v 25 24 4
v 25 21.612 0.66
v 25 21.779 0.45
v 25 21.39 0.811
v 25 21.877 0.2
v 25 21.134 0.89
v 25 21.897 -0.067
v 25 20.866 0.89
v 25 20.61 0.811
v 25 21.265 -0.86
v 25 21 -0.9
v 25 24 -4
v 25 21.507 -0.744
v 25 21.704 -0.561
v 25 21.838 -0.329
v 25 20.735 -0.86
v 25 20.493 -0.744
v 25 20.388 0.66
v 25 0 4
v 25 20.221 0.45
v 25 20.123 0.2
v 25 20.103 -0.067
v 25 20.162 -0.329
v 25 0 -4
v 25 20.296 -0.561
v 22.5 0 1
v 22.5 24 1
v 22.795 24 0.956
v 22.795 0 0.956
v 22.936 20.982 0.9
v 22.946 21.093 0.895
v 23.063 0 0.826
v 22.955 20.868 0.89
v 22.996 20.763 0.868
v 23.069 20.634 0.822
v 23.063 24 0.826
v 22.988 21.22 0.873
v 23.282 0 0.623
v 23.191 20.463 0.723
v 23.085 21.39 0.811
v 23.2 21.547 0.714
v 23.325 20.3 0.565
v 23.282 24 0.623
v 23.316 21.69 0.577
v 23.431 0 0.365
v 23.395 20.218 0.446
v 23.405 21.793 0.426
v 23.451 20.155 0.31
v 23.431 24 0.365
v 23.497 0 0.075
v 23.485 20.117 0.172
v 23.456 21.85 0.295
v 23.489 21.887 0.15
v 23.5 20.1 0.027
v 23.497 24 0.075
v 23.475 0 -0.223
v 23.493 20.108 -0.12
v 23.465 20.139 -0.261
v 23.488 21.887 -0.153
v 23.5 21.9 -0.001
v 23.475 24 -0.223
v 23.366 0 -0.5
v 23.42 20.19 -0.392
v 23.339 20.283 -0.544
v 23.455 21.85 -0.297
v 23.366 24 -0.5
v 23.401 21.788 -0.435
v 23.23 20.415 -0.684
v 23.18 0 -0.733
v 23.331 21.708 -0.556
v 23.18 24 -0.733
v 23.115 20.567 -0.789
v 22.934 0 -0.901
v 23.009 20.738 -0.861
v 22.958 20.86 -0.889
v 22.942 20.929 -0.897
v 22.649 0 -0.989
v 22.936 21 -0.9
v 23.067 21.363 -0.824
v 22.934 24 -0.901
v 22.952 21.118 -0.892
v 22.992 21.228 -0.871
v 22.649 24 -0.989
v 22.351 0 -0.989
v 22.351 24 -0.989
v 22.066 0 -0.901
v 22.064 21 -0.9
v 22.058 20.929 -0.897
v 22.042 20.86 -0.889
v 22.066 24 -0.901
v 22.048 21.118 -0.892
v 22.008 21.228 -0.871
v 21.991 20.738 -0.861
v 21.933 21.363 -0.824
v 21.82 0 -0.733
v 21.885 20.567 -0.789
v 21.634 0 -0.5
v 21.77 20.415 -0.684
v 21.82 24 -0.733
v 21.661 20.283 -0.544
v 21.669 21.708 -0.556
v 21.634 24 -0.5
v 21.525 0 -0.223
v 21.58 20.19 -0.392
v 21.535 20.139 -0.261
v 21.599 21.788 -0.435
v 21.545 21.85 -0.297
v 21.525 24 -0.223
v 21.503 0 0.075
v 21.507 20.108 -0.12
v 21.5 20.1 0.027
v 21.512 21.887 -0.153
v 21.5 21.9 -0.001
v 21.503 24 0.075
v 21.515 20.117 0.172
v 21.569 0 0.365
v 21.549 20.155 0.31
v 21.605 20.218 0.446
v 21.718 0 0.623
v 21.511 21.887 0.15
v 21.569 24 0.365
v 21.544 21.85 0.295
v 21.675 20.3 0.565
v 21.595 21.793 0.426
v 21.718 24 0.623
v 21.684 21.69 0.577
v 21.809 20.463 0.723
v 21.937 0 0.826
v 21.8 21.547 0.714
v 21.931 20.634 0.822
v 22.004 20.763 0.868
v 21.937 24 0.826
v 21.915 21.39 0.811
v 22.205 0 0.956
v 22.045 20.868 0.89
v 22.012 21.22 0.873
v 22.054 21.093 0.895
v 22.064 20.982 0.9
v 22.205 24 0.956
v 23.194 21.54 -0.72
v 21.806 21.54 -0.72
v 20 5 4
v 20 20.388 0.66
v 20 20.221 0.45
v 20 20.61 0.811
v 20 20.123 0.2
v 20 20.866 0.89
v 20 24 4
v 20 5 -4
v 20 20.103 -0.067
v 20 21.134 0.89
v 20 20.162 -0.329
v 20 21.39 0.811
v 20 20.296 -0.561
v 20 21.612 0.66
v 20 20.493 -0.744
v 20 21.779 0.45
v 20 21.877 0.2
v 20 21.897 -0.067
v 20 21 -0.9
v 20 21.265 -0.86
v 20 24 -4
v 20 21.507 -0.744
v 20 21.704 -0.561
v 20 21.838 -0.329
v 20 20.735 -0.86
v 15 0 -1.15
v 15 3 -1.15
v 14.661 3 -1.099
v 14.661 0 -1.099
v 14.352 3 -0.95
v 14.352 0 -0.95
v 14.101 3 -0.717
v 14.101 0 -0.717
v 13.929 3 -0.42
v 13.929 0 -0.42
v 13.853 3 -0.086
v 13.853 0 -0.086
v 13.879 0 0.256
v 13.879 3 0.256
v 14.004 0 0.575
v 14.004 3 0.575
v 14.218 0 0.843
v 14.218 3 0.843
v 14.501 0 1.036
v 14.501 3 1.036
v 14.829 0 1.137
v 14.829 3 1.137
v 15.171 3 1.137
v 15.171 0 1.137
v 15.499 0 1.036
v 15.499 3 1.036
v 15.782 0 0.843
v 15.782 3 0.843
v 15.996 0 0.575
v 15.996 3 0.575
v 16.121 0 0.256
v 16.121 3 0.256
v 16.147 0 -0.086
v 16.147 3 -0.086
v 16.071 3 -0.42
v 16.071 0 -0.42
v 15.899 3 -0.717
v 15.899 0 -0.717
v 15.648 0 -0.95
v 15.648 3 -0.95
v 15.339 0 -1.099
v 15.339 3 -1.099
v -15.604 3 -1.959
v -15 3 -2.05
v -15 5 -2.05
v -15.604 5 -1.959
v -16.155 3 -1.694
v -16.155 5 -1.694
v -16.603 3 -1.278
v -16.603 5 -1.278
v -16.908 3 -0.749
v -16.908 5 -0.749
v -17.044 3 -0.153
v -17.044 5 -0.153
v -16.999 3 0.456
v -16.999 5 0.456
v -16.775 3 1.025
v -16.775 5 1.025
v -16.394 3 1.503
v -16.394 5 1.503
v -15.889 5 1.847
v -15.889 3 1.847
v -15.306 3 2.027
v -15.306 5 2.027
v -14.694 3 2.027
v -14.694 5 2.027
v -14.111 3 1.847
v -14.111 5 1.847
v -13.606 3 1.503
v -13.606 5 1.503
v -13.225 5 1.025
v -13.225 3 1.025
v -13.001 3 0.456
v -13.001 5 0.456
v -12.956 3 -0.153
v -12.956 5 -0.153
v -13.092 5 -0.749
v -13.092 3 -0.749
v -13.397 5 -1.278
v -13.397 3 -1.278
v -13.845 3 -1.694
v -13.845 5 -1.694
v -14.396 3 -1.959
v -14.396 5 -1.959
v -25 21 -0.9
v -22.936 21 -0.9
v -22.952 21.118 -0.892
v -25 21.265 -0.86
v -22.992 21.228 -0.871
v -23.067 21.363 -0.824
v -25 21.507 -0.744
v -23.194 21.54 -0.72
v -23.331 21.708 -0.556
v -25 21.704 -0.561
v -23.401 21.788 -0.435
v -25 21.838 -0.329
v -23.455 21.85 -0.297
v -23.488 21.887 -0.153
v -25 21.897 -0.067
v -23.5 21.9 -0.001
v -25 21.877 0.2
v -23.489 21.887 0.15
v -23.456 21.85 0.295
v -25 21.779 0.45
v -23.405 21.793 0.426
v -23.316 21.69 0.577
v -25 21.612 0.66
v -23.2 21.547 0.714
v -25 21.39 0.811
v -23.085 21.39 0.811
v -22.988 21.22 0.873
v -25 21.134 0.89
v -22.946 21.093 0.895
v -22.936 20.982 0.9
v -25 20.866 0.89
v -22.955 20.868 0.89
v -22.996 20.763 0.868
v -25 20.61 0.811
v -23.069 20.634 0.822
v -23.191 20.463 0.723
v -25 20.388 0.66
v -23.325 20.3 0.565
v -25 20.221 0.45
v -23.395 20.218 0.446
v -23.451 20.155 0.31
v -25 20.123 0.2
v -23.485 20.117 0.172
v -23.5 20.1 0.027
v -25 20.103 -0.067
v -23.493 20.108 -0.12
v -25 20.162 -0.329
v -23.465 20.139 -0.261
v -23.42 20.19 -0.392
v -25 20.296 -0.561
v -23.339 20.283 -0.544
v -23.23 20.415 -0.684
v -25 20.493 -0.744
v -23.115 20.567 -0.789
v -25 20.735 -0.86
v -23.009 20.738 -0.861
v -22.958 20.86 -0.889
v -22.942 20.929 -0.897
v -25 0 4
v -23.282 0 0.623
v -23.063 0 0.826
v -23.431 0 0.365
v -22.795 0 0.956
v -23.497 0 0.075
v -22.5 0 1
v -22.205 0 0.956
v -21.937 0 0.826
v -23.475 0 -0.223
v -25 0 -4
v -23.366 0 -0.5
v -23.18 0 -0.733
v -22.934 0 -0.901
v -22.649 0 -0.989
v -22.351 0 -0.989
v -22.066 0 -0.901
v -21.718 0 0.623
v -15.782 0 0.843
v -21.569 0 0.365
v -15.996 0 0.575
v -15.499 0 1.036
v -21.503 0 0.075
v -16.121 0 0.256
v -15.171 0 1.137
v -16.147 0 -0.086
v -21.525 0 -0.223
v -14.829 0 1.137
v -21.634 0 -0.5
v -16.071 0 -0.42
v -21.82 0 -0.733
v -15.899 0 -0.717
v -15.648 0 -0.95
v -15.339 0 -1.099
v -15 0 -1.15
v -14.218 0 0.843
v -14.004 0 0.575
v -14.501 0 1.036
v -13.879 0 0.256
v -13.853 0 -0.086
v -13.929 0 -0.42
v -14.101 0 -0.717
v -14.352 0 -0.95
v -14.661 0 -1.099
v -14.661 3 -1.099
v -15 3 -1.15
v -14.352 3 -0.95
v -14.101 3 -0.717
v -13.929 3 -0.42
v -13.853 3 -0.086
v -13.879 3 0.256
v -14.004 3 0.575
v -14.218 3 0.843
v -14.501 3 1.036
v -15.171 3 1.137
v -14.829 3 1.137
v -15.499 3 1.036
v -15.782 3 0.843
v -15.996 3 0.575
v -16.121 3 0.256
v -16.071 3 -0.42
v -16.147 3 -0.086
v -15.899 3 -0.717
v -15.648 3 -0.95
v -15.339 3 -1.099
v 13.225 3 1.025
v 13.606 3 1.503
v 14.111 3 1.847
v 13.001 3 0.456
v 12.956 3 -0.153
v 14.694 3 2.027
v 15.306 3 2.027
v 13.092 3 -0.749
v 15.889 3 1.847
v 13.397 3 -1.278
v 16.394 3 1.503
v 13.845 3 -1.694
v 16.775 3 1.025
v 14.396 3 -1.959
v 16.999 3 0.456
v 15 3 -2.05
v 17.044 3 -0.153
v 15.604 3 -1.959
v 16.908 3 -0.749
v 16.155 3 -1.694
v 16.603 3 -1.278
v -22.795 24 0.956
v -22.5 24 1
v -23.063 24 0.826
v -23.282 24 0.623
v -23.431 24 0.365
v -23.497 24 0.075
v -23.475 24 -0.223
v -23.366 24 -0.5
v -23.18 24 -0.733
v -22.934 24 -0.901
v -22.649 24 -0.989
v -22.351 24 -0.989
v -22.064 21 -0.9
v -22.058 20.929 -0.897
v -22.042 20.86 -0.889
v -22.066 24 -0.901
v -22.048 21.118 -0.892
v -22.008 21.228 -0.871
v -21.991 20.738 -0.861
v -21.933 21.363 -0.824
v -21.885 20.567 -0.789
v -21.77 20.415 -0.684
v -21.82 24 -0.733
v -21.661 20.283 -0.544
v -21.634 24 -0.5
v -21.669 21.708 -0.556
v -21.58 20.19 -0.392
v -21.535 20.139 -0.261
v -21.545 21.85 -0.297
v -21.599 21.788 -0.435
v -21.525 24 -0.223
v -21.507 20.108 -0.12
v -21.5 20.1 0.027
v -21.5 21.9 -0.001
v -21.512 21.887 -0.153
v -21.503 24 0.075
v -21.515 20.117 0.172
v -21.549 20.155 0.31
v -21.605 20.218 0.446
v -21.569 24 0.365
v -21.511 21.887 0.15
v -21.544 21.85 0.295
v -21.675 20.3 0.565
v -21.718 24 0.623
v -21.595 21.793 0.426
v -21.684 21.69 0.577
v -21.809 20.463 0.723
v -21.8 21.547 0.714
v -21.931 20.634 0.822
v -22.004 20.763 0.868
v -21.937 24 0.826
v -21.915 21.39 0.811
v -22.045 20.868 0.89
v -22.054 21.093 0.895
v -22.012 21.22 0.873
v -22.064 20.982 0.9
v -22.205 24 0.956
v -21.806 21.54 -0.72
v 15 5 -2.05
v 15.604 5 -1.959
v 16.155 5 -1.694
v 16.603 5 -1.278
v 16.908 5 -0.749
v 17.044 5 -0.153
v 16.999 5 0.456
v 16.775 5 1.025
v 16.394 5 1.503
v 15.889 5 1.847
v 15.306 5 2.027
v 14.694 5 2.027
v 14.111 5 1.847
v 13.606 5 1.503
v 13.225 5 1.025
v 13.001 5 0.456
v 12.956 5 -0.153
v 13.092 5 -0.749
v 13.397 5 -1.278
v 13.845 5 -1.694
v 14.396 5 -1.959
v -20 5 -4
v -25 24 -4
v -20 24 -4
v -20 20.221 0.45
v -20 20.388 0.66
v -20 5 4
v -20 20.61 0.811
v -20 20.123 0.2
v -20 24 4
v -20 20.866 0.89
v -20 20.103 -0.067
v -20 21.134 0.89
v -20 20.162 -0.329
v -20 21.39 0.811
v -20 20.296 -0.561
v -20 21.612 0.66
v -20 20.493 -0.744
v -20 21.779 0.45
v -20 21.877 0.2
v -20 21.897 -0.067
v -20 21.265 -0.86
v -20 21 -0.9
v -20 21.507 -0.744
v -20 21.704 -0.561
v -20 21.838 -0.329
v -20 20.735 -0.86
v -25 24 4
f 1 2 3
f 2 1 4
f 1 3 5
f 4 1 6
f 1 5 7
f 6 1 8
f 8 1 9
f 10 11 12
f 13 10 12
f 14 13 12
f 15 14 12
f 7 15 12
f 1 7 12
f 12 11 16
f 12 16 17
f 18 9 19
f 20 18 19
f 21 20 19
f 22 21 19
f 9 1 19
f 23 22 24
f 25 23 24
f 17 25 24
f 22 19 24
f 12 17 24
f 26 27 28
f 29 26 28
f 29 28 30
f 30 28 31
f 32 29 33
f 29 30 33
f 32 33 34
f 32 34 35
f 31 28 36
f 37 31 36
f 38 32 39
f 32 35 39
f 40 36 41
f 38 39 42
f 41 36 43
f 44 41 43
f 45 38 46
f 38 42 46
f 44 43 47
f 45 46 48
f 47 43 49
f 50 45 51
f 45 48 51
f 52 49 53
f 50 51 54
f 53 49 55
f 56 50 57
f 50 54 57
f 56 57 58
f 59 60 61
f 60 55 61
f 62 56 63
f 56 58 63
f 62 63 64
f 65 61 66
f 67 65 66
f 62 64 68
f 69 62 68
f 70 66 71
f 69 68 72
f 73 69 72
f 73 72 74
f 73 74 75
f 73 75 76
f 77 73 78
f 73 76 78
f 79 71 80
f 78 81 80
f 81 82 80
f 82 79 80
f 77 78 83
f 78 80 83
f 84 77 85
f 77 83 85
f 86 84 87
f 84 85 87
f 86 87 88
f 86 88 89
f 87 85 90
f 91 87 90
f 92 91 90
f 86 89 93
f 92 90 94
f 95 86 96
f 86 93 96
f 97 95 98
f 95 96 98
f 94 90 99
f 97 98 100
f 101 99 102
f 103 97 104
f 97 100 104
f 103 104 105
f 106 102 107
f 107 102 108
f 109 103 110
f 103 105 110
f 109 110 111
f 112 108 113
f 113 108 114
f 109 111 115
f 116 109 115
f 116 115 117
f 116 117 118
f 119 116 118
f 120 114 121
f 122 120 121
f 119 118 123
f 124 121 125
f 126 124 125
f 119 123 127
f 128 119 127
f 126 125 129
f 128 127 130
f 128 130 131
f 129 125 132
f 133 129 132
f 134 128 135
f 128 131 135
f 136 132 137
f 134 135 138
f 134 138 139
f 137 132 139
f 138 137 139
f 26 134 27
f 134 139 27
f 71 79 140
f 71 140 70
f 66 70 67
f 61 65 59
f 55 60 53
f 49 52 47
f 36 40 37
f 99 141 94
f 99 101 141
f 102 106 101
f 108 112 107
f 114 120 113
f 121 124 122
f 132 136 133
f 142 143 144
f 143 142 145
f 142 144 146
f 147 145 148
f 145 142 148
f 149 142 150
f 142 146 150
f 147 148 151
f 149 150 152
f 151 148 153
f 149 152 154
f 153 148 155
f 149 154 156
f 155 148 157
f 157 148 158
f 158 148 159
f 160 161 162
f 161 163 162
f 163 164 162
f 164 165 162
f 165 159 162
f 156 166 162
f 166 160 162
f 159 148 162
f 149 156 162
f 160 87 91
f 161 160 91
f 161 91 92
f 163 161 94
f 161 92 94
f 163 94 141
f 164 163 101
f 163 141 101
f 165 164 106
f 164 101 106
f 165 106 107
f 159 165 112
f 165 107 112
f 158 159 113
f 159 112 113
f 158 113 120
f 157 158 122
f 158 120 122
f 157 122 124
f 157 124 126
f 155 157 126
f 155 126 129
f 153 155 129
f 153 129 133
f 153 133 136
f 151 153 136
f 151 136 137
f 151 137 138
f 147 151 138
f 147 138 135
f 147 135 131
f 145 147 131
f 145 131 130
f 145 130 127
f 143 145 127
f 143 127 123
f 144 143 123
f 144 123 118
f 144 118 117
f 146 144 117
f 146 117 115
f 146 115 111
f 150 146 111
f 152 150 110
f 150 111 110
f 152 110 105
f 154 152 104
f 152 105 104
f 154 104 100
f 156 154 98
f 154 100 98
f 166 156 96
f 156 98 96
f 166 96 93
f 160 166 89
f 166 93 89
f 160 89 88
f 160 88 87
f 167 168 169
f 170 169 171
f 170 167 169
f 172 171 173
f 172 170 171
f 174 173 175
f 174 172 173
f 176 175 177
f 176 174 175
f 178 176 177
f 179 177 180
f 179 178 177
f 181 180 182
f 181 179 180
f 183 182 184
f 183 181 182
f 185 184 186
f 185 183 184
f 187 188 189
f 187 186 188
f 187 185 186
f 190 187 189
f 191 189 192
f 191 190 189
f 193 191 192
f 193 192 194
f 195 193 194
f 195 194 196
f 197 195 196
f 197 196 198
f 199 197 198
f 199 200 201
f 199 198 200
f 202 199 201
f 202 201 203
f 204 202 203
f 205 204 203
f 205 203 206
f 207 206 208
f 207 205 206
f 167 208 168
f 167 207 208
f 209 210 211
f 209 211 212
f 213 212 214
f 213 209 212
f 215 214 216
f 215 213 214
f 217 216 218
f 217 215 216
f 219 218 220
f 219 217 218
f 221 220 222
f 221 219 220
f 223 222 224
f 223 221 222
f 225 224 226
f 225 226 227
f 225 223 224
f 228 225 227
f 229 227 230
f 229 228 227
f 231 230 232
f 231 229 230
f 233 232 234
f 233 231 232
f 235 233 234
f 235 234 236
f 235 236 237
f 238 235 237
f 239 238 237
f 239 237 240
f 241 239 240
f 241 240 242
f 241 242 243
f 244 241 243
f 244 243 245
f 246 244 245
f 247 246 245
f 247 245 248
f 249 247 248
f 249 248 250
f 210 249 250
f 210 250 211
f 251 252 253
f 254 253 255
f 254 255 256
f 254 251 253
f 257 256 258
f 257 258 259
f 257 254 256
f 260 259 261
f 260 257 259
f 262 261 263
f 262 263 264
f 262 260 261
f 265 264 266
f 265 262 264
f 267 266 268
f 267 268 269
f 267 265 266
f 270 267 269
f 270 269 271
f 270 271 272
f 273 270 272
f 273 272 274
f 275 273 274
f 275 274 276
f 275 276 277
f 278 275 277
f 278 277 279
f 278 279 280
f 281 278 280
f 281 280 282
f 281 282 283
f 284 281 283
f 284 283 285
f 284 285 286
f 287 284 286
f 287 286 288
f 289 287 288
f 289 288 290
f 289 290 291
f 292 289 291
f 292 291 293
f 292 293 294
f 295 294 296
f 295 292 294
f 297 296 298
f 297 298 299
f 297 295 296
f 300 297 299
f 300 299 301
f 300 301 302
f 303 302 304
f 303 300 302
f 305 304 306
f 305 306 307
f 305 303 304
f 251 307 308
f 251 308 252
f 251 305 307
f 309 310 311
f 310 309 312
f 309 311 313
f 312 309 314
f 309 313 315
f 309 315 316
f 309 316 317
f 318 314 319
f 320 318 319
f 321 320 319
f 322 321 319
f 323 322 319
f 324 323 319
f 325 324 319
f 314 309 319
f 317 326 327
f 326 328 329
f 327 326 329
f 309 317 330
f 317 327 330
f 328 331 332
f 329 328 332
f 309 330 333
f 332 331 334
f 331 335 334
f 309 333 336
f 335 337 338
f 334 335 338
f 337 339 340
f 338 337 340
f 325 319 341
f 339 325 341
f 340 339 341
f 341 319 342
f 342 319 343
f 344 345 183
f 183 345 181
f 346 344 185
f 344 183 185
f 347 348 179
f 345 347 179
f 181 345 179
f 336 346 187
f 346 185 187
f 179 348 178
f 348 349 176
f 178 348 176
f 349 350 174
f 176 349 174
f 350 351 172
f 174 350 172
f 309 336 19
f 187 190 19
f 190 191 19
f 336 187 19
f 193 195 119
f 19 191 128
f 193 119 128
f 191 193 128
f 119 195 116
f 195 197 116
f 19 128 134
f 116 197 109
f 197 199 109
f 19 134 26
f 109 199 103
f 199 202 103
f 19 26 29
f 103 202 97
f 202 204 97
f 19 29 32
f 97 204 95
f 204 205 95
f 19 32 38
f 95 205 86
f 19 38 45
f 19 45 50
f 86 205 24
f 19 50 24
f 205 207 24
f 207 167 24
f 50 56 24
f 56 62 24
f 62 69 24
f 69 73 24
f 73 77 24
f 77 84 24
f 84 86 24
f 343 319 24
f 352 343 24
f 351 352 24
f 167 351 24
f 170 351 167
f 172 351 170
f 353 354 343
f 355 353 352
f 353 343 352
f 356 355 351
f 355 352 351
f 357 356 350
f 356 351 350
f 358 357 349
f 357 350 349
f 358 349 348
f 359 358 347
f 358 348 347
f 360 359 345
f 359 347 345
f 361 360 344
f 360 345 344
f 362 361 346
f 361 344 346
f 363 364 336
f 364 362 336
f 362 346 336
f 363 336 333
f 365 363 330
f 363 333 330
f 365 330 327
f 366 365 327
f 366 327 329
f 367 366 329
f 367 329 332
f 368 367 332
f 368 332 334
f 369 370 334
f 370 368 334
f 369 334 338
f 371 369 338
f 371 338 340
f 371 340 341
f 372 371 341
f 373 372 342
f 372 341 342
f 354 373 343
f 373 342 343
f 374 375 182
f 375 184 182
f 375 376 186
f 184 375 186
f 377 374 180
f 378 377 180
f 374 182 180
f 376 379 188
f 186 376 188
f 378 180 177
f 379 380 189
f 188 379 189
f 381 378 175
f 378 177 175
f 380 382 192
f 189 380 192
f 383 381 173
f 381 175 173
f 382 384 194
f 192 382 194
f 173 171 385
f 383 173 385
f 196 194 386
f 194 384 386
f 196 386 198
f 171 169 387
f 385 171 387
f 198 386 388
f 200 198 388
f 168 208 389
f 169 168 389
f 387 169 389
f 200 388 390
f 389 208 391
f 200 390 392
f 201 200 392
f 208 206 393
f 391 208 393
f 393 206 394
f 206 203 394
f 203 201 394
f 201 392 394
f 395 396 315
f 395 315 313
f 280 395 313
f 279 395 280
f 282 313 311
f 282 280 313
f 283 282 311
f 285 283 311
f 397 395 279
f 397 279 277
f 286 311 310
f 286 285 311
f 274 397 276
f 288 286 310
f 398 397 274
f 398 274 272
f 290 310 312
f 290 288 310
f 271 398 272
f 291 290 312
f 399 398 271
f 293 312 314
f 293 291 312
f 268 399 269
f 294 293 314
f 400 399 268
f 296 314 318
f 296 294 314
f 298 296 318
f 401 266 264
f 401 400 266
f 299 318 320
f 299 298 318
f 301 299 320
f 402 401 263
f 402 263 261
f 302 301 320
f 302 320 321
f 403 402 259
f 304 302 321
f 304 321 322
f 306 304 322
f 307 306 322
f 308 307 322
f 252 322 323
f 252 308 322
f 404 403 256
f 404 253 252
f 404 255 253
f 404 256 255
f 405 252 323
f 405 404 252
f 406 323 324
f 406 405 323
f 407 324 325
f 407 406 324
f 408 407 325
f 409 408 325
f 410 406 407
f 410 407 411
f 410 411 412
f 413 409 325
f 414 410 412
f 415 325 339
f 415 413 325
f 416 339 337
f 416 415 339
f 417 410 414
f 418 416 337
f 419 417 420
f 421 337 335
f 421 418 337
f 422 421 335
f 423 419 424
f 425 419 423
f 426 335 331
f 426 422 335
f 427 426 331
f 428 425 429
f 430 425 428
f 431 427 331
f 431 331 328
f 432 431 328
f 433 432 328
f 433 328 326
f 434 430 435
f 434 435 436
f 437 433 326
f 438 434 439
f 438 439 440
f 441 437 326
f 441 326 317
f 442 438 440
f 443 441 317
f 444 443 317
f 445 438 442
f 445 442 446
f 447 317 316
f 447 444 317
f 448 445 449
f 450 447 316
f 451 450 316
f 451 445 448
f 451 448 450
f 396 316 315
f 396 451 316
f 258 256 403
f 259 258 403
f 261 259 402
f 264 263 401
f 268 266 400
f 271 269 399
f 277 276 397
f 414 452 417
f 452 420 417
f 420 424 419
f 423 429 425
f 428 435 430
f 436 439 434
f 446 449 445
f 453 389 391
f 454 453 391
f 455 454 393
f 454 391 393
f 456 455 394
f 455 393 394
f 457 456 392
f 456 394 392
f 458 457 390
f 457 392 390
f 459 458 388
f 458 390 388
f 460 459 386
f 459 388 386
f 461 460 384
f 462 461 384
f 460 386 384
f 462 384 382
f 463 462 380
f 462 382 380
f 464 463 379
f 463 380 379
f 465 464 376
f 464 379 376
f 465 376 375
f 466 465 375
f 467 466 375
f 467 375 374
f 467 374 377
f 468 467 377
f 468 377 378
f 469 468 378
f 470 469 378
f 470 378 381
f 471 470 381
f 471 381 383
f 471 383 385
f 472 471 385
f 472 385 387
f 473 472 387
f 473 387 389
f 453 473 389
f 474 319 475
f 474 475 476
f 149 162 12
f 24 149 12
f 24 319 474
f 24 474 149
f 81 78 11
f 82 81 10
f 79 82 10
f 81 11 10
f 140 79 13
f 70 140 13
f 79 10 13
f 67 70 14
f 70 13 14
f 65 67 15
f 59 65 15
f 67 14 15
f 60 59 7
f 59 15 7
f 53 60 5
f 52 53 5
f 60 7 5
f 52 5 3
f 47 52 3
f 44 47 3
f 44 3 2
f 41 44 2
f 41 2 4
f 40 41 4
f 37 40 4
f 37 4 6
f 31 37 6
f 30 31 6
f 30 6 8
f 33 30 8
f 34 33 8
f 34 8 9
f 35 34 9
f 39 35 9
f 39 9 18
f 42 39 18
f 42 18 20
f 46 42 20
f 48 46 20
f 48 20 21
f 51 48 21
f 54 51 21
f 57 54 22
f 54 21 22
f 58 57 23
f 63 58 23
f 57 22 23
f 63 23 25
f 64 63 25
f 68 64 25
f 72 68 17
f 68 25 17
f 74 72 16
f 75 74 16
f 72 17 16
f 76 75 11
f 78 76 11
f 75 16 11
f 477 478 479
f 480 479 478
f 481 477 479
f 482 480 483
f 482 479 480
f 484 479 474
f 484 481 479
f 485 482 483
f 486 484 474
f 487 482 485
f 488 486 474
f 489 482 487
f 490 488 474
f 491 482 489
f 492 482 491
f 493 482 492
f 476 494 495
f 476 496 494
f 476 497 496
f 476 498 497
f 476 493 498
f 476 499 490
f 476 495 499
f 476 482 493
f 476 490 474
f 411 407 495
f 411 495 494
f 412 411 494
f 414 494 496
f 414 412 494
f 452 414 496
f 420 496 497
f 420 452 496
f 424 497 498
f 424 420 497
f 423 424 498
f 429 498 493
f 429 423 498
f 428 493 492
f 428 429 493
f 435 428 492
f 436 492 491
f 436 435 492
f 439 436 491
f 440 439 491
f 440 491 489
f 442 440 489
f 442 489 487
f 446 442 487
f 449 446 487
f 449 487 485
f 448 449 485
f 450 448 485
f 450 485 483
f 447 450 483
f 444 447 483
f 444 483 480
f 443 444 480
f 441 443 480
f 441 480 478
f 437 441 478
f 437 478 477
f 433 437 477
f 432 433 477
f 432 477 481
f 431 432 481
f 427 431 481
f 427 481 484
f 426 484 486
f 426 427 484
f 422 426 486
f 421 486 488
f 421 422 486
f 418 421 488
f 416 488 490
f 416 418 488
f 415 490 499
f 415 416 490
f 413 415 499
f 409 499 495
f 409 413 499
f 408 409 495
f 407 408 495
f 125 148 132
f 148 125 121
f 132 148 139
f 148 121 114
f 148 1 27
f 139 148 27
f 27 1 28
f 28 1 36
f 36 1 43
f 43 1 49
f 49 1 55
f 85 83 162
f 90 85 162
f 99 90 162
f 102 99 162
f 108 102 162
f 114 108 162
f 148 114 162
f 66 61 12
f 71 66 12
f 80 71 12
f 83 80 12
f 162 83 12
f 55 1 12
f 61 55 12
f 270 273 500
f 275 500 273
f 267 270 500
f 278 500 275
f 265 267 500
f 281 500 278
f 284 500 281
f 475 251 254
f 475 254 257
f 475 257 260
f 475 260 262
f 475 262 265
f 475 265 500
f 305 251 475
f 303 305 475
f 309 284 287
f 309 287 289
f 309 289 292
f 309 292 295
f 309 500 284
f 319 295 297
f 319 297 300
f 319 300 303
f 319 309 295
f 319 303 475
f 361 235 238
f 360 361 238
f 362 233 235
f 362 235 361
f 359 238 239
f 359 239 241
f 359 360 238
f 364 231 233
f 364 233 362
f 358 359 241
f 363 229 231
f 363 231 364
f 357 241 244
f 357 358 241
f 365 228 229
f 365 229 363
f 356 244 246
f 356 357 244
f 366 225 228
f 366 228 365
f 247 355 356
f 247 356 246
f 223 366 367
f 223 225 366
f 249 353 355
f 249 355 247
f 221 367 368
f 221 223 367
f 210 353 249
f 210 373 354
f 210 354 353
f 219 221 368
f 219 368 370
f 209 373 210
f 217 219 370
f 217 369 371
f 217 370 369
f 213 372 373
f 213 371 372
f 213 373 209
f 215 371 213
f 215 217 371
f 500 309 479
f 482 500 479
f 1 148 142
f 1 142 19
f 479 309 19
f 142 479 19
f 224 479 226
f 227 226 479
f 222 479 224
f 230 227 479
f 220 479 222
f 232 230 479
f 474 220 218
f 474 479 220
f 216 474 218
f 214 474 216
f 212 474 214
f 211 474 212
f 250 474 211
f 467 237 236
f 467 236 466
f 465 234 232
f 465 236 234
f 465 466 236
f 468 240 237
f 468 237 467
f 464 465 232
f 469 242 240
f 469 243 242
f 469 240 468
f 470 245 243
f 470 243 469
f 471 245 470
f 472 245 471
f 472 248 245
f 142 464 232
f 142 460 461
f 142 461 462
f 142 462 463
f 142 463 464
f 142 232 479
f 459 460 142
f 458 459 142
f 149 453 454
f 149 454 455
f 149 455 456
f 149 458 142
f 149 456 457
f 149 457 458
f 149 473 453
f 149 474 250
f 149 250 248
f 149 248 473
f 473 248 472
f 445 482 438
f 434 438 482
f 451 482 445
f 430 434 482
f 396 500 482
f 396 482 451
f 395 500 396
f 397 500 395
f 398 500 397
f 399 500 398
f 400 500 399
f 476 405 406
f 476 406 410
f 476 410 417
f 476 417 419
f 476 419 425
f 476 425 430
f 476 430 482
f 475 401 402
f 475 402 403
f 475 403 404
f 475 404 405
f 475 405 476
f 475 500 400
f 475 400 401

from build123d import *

# Parameters (mm, degrees)
SKETCH1_W           = 50
SKETCH1_H           = 8
BOSS_EXTRUDE1_DEPTH = 5
SKETCH5_W           = 8
SKETCH5_H           = 24
SKETCH5_R           = 0.9
BOSS_EXTRUDE3_DEPTH = 5
CUT_EXTRUDE3_REACH  = 36.886
SKETCH6_R           = 1
SKETCH2_R           = 1.15
CUT_EXTRUDE1_DEPTH  = 35.885527225
CUT_EXTRUDE4_REACH  = 39.886
CUT_EXTRUDE4_START  = -3
SKETCH7_R           = 2.05


with BuildPart() as part:
    # Sketch1 → Boss-Extrude1 (new body)
    with BuildSketch(Plane(origin=(0, 0, 0), x_dir=(1, 0, 0), z_dir=(0, 1, 0))):
        Rectangle(SKETCH1_W, SKETCH1_H)
    extrude(amount=BOSS_EXTRUDE1_DEPTH)

    # Sketch5 → Boss-Extrude3 (add)
    with BuildSketch(Plane(origin=(25, 0, 0), x_dir=(0, 0, -1), z_dir=(1, 0, 0))):
        with Locations((0, 12)):
            Rectangle(SKETCH5_W, SKETCH5_H)
        with Locations((0, 21)):
            Circle(SKETCH5_R, mode=Mode.SUBTRACT)
    boss_extrude3 = extrude(amount=-BOSS_EXTRUDE3_DEPTH)

    # Sketch6 → Cut-Extrude3 (cut, up to next)
    with BuildSketch(Plane(origin=(0, 24, 0), x_dir=(1, 0, 0), z_dir=(0, 1, 0)), mode=Mode.PRIVATE) as cut_extrude3_sk1:
        with Locations(Location((22.5, 0, 0), (0, 0, 270))):
            Circle(SKETCH6_R)
    cut_extrude3_tool1 = extrude(cut_extrude3_sk1.sketch, amount=-CUT_EXTRUDE3_REACH, mode=Mode.PRIVATE) & part.part
    cut_extrude3 = cut_extrude3_tool1.solids().sort_by_distance((22.5, 24, 0))[0]
    add(cut_extrude3, mode=Mode.SUBTRACT)

    # Sketch2 → Cut-Extrude1 (cut, through all)
    with BuildSketch(Plane(origin=(0, 0, 0), x_dir=(1, 0, 0), z_dir=(0, 1, 0))):
        with Locations(Location((15, 0, 0), (0, 0, 90))):
            Circle(SKETCH2_R)
    cut_extrude1 = extrude(amount=CUT_EXTRUDE1_DEPTH, mode=Mode.SUBTRACT)

    # Sketch7 → Cut-Extrude4 (cut, up to next)
    with BuildSketch(Plane.XZ.offset(CUT_EXTRUDE4_START), mode=Mode.PRIVATE) as cut_extrude4_sk1:
        with Locations(Location((15, 0, 0), (0, 0, 270))):
            Circle(SKETCH7_R)
    cut_extrude4_tool1 = extrude(cut_extrude4_sk1.sketch, amount=-CUT_EXTRUDE4_REACH, mode=Mode.PRIVATE) & part.part
    cut_extrude4 = cut_extrude4_tool1.solids().sort_by_distance((15, 3, 0))[0]
    add(cut_extrude4, mode=Mode.SUBTRACT)

    # Mirror5: Boss-Extrude3, Cut-Extrude3, Cut-Extrude1, Cut-Extrude4 across plane
    add(boss_extrude3.mirror(Plane(origin=(0, 0, 0), x_dir=(0, 0, 1), z_dir=(1, 0, 0))))
    add(cut_extrude3.mirror(Plane(origin=(0, 0, 0), x_dir=(0, 0, 1), z_dir=(1, 0, 0))), mode=Mode.SUBTRACT)
    add(cut_extrude1.mirror(Plane(origin=(0, 0, 0), x_dir=(0, 0, 1), z_dir=(1, 0, 0))), mode=Mode.SUBTRACT)
    add(cut_extrude4.mirror(Plane(origin=(0, 0, 0), x_dir=(0, 0, 1), z_dir=(1, 0, 0))), mode=Mode.SUBTRACT)


solid = part.part
